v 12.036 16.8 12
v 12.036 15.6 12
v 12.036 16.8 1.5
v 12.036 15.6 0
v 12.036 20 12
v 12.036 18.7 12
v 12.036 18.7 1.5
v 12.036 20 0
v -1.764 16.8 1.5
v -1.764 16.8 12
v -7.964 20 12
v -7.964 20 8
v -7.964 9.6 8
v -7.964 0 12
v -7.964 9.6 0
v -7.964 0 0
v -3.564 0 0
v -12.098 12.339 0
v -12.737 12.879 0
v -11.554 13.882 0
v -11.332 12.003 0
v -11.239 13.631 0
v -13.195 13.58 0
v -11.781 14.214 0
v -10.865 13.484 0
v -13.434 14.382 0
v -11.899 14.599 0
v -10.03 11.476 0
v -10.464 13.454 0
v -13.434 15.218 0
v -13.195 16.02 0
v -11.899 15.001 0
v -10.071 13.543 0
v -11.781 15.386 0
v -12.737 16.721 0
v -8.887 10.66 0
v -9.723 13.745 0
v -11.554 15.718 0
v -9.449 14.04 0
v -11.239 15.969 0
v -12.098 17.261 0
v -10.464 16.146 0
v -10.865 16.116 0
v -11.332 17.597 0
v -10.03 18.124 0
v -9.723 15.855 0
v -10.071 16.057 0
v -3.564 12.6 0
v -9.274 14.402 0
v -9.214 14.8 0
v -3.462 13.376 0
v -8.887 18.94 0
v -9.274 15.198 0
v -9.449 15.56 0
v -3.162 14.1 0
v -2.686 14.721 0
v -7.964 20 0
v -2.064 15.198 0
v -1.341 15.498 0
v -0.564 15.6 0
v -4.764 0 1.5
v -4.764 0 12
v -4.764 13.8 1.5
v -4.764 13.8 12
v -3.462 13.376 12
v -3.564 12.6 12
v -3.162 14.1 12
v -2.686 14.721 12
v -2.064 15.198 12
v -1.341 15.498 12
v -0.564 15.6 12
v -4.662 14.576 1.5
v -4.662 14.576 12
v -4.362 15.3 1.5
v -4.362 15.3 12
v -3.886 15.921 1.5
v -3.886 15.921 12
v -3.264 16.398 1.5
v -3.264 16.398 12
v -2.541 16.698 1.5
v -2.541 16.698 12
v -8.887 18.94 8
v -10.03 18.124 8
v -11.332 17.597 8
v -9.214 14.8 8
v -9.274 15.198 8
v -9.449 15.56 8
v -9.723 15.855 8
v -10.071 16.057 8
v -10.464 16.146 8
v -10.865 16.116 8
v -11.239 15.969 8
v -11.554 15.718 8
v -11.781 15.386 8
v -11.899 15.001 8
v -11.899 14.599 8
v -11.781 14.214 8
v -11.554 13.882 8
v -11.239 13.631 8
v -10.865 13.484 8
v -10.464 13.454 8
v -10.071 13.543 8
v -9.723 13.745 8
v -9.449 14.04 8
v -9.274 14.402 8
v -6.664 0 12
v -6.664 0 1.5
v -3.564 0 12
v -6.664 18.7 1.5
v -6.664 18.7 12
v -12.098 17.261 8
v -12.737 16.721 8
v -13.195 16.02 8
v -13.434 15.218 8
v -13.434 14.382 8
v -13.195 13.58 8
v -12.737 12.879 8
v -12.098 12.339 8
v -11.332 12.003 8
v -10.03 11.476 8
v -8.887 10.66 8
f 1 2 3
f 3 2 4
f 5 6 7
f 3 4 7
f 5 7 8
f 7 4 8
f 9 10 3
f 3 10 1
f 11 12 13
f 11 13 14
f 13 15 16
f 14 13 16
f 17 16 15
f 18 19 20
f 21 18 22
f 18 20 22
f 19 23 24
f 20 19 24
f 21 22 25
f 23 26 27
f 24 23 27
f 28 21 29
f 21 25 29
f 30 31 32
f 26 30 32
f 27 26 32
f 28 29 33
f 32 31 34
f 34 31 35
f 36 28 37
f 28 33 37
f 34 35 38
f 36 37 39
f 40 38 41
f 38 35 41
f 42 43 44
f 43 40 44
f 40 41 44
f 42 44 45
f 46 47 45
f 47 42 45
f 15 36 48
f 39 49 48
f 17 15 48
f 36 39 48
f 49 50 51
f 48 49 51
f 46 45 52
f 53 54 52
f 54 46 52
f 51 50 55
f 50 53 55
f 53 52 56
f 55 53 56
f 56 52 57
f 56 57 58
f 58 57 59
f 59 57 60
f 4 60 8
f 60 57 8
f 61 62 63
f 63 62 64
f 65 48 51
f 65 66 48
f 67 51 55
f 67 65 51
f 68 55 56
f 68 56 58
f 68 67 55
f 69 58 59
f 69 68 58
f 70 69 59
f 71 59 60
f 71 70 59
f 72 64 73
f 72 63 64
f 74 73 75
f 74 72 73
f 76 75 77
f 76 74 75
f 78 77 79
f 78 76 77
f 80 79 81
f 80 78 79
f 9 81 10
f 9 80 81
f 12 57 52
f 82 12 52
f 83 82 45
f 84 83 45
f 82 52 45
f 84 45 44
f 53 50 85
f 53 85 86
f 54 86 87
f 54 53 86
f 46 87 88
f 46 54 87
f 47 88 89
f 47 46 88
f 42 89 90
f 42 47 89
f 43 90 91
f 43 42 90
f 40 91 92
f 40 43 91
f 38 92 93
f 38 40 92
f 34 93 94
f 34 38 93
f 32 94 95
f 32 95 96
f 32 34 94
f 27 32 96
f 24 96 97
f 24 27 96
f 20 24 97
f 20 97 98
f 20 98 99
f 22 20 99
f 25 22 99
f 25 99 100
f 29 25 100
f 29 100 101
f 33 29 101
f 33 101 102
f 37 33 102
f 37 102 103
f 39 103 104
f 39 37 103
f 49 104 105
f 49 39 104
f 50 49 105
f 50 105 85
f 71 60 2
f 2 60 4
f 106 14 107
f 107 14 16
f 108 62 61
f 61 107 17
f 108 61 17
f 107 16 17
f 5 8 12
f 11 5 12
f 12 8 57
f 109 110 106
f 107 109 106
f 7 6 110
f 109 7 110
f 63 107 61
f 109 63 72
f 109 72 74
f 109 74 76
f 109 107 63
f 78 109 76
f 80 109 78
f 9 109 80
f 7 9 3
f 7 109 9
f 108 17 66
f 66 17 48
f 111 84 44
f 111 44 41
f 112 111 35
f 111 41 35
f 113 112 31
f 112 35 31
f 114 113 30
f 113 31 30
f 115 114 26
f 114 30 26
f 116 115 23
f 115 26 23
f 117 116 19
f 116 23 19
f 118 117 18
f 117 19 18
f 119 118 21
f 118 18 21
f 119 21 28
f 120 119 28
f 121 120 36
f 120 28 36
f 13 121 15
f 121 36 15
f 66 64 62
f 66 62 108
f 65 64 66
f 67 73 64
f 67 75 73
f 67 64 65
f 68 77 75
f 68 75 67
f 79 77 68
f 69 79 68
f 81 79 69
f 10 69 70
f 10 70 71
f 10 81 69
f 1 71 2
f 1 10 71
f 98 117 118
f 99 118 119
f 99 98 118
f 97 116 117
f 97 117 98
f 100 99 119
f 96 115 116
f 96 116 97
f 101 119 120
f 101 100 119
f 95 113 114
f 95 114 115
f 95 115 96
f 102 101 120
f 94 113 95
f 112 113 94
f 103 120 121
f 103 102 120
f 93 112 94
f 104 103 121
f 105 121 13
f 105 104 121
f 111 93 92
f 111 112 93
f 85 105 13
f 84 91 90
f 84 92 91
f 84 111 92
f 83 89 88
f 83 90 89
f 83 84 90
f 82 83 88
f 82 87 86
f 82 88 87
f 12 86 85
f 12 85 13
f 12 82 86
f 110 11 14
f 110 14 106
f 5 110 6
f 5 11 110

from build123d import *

# Parameters (mm, degrees)
F1_DEPTH = 12
F3_DEPTH = 10.5
F4_R     = 3
F5_R     = 1.35
F6_DEPTH = 8


with BuildPart() as f1:
    # F0 (on Top) → F1 (new body)
    with BuildSketch(Plane.XY):
        Polygon((-7.96441, 20), (-7.96441, 0), (-3.56441, 0), (-3.56441, 15.6), (12.03559, 15.6), (12.03559, 20), align=None)
    extrude(amount=F1_DEPTH)

    # F2 (on face) → F3 (cut)
    with BuildSketch(Plane.XY.offset(12)):
        Polygon((-6.66441, 0), (-5.76441, 0), (-5.76441, 17.8), (12.03559, 17.8), (12.03559, 18.7), (-6.66441, 18.7), align=None)
        Polygon((-5.76441, 17.8), (-5.76441, 0), (-4.76441, 0), (-4.76441, 16.8), (12.03559, 16.8), (12.03559, 17.8), align=None)
    extrude(amount=-F3_DEPTH, mode=Mode.SUBTRACT)

    # F4
    f4_edges = [f1.edges().sort_by_distance(p)[0] for p in [
        (-4.76441, 16.8, 6.75),
        (-3.56441, 15.6, 6),
    ]]
    fillet(f4_edges, radius=F4_R)

    # F5 (on Top) → F6 (join)
    with BuildSketch(Plane.XY):
        with BuildLine():
            ThreePointArc((-7.96441, 20), (-9.434479, 18.498851), (-11.331965, 17.59658))
            ThreePointArc((-11.331965, 17.59658), (-9.376537, 17.445554), (-7.96441, 16.084523))
            Line((-7.96441, 16.084523), (-7.96441, 20))
        make_face()
        with BuildLine():
            ThreePointArc((-7.96441, 13.515477), (-9.376537, 12.154446), (-11.331965, 12.00342))
            ThreePointArc((-11.331965, 12.00342), (-9.434479, 11.101149), (-7.96441, 9.6))
            Line((-7.96441, 9.6), (-7.96441, 13.515477))
        make_face()
        with BuildLine():
            ThreePointArc((-7.96441, 16.084523), (-9.376537, 17.445554), (-11.331965, 17.59658))
            ThreePointArc((-11.331965, 17.59658), (-13.46441, 14.8), (-11.331965, 12.00342))
            ThreePointArc((-11.331965, 12.00342), (-9.376537, 12.154446), (-7.96441, 13.515477))
            Line((-7.96441, 13.515477), (-7.96441, 16.084523))
        make_face()
        with Locations((-10.56441, 14.8)):
            Circle(F5_R, mode=Mode.SUBTRACT)
    extrude(amount=F6_DEPTH)


solid = f1.part
